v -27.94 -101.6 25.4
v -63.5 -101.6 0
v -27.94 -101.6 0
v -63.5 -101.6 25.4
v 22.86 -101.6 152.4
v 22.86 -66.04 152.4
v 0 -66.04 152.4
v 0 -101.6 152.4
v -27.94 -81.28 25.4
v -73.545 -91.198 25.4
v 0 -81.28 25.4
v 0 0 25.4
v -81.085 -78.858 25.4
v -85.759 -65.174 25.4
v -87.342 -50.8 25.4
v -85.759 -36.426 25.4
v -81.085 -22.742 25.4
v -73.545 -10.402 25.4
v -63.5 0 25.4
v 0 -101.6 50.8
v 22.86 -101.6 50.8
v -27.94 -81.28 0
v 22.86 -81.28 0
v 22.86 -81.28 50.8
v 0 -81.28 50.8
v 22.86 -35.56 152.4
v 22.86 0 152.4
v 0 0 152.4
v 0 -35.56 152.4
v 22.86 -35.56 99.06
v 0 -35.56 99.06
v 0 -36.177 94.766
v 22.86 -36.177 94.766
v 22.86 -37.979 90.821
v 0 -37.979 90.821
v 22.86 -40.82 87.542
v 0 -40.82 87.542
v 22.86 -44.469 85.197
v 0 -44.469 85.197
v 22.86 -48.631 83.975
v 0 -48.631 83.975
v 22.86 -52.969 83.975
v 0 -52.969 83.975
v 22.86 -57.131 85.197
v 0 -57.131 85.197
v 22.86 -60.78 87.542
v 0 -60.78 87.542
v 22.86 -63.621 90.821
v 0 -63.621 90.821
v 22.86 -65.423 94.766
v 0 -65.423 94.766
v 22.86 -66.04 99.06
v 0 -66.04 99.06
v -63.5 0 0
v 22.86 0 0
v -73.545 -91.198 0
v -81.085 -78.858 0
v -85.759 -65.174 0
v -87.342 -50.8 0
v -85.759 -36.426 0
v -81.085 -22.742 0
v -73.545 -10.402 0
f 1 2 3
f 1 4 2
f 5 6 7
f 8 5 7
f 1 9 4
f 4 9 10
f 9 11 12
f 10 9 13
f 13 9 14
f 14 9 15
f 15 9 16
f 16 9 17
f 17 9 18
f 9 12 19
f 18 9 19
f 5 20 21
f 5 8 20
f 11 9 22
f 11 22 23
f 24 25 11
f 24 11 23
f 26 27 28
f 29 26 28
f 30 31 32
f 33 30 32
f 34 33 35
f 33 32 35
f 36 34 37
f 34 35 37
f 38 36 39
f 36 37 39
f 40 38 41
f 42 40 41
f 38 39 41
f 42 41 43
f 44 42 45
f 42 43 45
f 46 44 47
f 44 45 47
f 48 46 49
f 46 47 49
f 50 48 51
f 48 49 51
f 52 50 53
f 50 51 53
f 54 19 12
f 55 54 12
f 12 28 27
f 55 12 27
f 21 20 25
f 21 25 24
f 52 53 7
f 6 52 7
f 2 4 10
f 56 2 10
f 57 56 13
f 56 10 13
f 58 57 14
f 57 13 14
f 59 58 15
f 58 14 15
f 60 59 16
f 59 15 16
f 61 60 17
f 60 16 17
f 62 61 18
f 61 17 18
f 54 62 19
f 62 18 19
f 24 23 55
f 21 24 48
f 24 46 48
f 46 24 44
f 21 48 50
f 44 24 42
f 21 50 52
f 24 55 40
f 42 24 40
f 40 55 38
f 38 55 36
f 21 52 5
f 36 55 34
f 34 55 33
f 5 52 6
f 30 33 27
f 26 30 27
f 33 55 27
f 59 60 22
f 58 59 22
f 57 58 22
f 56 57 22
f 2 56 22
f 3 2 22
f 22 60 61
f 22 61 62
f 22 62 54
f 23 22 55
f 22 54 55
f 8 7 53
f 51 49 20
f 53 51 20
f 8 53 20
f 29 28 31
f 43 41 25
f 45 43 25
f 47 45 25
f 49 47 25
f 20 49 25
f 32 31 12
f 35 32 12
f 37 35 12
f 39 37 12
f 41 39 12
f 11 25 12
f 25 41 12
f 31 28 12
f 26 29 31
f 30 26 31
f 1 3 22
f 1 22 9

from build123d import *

# Parameters (mm, degrees)
F1_DEPTH = 101.6
F3_DEPTH = 25.401
F4_W     = 50.8
F4_H     = 50.8
F5_DEPTH = 20.32
F7_DEPTH = 22.861


with BuildPart() as f1:
    # F0 (on Front) → F1 (new body)
    with BuildSketch(Plane.XZ):
        Polygon((22.86, 152.4), (0, 152.4), (0, 25.4), (-88.9, 25.4), (-88.9, 0), (0, 0), (22.86, 0), align=None)
    extrude(amount=F1_DEPTH)

    # F2 (on face) → F3 (cut, through all)
    with BuildSketch(Plane.XY.offset(25.4)):
        with BuildLine():
            Line((-88.9, -101.6), (-63.5, -101.6))
            ThreePointArc((-63.5, -101.6), (-87.342351, -50.8), (-63.5, 0))
            Line((-63.5, 0), (-88.9, 0))
            Line((-88.9, 0), (-88.9, -101.6))
        make_face()
    extrude(amount=-F3_DEPTH, mode=Mode.SUBTRACT)

    # F4 (on face) → F5 (cut)
    with BuildSketch(Plane.XZ.offset(101.6)):
        with Locations((-2.54, 25.4)):
            Rectangle(F4_W, F4_H)
    extrude(amount=-F5_DEPTH, mode=Mode.SUBTRACT)

    # F6 (on face) → F7 (cut, through all)
    with BuildSketch(Plane(origin=(0, 0, 0), x_dir=(0, -1, 0), z_dir=(-1, 0, 0))):
        with BuildLine():
            Line((66.04, 152.4), (35.56, 152.4))
            Line((35.56, 152.4), (35.56, 99.06))
            ThreePointArc((35.56, 99.06), (50.8, 83.82), (66.04, 99.06))
            Line((66.04, 99.06), (66.04, 152.4))
        make_face()
    extrude(amount=-F7_DEPTH, mode=Mode.SUBTRACT)


solid = f1.part
